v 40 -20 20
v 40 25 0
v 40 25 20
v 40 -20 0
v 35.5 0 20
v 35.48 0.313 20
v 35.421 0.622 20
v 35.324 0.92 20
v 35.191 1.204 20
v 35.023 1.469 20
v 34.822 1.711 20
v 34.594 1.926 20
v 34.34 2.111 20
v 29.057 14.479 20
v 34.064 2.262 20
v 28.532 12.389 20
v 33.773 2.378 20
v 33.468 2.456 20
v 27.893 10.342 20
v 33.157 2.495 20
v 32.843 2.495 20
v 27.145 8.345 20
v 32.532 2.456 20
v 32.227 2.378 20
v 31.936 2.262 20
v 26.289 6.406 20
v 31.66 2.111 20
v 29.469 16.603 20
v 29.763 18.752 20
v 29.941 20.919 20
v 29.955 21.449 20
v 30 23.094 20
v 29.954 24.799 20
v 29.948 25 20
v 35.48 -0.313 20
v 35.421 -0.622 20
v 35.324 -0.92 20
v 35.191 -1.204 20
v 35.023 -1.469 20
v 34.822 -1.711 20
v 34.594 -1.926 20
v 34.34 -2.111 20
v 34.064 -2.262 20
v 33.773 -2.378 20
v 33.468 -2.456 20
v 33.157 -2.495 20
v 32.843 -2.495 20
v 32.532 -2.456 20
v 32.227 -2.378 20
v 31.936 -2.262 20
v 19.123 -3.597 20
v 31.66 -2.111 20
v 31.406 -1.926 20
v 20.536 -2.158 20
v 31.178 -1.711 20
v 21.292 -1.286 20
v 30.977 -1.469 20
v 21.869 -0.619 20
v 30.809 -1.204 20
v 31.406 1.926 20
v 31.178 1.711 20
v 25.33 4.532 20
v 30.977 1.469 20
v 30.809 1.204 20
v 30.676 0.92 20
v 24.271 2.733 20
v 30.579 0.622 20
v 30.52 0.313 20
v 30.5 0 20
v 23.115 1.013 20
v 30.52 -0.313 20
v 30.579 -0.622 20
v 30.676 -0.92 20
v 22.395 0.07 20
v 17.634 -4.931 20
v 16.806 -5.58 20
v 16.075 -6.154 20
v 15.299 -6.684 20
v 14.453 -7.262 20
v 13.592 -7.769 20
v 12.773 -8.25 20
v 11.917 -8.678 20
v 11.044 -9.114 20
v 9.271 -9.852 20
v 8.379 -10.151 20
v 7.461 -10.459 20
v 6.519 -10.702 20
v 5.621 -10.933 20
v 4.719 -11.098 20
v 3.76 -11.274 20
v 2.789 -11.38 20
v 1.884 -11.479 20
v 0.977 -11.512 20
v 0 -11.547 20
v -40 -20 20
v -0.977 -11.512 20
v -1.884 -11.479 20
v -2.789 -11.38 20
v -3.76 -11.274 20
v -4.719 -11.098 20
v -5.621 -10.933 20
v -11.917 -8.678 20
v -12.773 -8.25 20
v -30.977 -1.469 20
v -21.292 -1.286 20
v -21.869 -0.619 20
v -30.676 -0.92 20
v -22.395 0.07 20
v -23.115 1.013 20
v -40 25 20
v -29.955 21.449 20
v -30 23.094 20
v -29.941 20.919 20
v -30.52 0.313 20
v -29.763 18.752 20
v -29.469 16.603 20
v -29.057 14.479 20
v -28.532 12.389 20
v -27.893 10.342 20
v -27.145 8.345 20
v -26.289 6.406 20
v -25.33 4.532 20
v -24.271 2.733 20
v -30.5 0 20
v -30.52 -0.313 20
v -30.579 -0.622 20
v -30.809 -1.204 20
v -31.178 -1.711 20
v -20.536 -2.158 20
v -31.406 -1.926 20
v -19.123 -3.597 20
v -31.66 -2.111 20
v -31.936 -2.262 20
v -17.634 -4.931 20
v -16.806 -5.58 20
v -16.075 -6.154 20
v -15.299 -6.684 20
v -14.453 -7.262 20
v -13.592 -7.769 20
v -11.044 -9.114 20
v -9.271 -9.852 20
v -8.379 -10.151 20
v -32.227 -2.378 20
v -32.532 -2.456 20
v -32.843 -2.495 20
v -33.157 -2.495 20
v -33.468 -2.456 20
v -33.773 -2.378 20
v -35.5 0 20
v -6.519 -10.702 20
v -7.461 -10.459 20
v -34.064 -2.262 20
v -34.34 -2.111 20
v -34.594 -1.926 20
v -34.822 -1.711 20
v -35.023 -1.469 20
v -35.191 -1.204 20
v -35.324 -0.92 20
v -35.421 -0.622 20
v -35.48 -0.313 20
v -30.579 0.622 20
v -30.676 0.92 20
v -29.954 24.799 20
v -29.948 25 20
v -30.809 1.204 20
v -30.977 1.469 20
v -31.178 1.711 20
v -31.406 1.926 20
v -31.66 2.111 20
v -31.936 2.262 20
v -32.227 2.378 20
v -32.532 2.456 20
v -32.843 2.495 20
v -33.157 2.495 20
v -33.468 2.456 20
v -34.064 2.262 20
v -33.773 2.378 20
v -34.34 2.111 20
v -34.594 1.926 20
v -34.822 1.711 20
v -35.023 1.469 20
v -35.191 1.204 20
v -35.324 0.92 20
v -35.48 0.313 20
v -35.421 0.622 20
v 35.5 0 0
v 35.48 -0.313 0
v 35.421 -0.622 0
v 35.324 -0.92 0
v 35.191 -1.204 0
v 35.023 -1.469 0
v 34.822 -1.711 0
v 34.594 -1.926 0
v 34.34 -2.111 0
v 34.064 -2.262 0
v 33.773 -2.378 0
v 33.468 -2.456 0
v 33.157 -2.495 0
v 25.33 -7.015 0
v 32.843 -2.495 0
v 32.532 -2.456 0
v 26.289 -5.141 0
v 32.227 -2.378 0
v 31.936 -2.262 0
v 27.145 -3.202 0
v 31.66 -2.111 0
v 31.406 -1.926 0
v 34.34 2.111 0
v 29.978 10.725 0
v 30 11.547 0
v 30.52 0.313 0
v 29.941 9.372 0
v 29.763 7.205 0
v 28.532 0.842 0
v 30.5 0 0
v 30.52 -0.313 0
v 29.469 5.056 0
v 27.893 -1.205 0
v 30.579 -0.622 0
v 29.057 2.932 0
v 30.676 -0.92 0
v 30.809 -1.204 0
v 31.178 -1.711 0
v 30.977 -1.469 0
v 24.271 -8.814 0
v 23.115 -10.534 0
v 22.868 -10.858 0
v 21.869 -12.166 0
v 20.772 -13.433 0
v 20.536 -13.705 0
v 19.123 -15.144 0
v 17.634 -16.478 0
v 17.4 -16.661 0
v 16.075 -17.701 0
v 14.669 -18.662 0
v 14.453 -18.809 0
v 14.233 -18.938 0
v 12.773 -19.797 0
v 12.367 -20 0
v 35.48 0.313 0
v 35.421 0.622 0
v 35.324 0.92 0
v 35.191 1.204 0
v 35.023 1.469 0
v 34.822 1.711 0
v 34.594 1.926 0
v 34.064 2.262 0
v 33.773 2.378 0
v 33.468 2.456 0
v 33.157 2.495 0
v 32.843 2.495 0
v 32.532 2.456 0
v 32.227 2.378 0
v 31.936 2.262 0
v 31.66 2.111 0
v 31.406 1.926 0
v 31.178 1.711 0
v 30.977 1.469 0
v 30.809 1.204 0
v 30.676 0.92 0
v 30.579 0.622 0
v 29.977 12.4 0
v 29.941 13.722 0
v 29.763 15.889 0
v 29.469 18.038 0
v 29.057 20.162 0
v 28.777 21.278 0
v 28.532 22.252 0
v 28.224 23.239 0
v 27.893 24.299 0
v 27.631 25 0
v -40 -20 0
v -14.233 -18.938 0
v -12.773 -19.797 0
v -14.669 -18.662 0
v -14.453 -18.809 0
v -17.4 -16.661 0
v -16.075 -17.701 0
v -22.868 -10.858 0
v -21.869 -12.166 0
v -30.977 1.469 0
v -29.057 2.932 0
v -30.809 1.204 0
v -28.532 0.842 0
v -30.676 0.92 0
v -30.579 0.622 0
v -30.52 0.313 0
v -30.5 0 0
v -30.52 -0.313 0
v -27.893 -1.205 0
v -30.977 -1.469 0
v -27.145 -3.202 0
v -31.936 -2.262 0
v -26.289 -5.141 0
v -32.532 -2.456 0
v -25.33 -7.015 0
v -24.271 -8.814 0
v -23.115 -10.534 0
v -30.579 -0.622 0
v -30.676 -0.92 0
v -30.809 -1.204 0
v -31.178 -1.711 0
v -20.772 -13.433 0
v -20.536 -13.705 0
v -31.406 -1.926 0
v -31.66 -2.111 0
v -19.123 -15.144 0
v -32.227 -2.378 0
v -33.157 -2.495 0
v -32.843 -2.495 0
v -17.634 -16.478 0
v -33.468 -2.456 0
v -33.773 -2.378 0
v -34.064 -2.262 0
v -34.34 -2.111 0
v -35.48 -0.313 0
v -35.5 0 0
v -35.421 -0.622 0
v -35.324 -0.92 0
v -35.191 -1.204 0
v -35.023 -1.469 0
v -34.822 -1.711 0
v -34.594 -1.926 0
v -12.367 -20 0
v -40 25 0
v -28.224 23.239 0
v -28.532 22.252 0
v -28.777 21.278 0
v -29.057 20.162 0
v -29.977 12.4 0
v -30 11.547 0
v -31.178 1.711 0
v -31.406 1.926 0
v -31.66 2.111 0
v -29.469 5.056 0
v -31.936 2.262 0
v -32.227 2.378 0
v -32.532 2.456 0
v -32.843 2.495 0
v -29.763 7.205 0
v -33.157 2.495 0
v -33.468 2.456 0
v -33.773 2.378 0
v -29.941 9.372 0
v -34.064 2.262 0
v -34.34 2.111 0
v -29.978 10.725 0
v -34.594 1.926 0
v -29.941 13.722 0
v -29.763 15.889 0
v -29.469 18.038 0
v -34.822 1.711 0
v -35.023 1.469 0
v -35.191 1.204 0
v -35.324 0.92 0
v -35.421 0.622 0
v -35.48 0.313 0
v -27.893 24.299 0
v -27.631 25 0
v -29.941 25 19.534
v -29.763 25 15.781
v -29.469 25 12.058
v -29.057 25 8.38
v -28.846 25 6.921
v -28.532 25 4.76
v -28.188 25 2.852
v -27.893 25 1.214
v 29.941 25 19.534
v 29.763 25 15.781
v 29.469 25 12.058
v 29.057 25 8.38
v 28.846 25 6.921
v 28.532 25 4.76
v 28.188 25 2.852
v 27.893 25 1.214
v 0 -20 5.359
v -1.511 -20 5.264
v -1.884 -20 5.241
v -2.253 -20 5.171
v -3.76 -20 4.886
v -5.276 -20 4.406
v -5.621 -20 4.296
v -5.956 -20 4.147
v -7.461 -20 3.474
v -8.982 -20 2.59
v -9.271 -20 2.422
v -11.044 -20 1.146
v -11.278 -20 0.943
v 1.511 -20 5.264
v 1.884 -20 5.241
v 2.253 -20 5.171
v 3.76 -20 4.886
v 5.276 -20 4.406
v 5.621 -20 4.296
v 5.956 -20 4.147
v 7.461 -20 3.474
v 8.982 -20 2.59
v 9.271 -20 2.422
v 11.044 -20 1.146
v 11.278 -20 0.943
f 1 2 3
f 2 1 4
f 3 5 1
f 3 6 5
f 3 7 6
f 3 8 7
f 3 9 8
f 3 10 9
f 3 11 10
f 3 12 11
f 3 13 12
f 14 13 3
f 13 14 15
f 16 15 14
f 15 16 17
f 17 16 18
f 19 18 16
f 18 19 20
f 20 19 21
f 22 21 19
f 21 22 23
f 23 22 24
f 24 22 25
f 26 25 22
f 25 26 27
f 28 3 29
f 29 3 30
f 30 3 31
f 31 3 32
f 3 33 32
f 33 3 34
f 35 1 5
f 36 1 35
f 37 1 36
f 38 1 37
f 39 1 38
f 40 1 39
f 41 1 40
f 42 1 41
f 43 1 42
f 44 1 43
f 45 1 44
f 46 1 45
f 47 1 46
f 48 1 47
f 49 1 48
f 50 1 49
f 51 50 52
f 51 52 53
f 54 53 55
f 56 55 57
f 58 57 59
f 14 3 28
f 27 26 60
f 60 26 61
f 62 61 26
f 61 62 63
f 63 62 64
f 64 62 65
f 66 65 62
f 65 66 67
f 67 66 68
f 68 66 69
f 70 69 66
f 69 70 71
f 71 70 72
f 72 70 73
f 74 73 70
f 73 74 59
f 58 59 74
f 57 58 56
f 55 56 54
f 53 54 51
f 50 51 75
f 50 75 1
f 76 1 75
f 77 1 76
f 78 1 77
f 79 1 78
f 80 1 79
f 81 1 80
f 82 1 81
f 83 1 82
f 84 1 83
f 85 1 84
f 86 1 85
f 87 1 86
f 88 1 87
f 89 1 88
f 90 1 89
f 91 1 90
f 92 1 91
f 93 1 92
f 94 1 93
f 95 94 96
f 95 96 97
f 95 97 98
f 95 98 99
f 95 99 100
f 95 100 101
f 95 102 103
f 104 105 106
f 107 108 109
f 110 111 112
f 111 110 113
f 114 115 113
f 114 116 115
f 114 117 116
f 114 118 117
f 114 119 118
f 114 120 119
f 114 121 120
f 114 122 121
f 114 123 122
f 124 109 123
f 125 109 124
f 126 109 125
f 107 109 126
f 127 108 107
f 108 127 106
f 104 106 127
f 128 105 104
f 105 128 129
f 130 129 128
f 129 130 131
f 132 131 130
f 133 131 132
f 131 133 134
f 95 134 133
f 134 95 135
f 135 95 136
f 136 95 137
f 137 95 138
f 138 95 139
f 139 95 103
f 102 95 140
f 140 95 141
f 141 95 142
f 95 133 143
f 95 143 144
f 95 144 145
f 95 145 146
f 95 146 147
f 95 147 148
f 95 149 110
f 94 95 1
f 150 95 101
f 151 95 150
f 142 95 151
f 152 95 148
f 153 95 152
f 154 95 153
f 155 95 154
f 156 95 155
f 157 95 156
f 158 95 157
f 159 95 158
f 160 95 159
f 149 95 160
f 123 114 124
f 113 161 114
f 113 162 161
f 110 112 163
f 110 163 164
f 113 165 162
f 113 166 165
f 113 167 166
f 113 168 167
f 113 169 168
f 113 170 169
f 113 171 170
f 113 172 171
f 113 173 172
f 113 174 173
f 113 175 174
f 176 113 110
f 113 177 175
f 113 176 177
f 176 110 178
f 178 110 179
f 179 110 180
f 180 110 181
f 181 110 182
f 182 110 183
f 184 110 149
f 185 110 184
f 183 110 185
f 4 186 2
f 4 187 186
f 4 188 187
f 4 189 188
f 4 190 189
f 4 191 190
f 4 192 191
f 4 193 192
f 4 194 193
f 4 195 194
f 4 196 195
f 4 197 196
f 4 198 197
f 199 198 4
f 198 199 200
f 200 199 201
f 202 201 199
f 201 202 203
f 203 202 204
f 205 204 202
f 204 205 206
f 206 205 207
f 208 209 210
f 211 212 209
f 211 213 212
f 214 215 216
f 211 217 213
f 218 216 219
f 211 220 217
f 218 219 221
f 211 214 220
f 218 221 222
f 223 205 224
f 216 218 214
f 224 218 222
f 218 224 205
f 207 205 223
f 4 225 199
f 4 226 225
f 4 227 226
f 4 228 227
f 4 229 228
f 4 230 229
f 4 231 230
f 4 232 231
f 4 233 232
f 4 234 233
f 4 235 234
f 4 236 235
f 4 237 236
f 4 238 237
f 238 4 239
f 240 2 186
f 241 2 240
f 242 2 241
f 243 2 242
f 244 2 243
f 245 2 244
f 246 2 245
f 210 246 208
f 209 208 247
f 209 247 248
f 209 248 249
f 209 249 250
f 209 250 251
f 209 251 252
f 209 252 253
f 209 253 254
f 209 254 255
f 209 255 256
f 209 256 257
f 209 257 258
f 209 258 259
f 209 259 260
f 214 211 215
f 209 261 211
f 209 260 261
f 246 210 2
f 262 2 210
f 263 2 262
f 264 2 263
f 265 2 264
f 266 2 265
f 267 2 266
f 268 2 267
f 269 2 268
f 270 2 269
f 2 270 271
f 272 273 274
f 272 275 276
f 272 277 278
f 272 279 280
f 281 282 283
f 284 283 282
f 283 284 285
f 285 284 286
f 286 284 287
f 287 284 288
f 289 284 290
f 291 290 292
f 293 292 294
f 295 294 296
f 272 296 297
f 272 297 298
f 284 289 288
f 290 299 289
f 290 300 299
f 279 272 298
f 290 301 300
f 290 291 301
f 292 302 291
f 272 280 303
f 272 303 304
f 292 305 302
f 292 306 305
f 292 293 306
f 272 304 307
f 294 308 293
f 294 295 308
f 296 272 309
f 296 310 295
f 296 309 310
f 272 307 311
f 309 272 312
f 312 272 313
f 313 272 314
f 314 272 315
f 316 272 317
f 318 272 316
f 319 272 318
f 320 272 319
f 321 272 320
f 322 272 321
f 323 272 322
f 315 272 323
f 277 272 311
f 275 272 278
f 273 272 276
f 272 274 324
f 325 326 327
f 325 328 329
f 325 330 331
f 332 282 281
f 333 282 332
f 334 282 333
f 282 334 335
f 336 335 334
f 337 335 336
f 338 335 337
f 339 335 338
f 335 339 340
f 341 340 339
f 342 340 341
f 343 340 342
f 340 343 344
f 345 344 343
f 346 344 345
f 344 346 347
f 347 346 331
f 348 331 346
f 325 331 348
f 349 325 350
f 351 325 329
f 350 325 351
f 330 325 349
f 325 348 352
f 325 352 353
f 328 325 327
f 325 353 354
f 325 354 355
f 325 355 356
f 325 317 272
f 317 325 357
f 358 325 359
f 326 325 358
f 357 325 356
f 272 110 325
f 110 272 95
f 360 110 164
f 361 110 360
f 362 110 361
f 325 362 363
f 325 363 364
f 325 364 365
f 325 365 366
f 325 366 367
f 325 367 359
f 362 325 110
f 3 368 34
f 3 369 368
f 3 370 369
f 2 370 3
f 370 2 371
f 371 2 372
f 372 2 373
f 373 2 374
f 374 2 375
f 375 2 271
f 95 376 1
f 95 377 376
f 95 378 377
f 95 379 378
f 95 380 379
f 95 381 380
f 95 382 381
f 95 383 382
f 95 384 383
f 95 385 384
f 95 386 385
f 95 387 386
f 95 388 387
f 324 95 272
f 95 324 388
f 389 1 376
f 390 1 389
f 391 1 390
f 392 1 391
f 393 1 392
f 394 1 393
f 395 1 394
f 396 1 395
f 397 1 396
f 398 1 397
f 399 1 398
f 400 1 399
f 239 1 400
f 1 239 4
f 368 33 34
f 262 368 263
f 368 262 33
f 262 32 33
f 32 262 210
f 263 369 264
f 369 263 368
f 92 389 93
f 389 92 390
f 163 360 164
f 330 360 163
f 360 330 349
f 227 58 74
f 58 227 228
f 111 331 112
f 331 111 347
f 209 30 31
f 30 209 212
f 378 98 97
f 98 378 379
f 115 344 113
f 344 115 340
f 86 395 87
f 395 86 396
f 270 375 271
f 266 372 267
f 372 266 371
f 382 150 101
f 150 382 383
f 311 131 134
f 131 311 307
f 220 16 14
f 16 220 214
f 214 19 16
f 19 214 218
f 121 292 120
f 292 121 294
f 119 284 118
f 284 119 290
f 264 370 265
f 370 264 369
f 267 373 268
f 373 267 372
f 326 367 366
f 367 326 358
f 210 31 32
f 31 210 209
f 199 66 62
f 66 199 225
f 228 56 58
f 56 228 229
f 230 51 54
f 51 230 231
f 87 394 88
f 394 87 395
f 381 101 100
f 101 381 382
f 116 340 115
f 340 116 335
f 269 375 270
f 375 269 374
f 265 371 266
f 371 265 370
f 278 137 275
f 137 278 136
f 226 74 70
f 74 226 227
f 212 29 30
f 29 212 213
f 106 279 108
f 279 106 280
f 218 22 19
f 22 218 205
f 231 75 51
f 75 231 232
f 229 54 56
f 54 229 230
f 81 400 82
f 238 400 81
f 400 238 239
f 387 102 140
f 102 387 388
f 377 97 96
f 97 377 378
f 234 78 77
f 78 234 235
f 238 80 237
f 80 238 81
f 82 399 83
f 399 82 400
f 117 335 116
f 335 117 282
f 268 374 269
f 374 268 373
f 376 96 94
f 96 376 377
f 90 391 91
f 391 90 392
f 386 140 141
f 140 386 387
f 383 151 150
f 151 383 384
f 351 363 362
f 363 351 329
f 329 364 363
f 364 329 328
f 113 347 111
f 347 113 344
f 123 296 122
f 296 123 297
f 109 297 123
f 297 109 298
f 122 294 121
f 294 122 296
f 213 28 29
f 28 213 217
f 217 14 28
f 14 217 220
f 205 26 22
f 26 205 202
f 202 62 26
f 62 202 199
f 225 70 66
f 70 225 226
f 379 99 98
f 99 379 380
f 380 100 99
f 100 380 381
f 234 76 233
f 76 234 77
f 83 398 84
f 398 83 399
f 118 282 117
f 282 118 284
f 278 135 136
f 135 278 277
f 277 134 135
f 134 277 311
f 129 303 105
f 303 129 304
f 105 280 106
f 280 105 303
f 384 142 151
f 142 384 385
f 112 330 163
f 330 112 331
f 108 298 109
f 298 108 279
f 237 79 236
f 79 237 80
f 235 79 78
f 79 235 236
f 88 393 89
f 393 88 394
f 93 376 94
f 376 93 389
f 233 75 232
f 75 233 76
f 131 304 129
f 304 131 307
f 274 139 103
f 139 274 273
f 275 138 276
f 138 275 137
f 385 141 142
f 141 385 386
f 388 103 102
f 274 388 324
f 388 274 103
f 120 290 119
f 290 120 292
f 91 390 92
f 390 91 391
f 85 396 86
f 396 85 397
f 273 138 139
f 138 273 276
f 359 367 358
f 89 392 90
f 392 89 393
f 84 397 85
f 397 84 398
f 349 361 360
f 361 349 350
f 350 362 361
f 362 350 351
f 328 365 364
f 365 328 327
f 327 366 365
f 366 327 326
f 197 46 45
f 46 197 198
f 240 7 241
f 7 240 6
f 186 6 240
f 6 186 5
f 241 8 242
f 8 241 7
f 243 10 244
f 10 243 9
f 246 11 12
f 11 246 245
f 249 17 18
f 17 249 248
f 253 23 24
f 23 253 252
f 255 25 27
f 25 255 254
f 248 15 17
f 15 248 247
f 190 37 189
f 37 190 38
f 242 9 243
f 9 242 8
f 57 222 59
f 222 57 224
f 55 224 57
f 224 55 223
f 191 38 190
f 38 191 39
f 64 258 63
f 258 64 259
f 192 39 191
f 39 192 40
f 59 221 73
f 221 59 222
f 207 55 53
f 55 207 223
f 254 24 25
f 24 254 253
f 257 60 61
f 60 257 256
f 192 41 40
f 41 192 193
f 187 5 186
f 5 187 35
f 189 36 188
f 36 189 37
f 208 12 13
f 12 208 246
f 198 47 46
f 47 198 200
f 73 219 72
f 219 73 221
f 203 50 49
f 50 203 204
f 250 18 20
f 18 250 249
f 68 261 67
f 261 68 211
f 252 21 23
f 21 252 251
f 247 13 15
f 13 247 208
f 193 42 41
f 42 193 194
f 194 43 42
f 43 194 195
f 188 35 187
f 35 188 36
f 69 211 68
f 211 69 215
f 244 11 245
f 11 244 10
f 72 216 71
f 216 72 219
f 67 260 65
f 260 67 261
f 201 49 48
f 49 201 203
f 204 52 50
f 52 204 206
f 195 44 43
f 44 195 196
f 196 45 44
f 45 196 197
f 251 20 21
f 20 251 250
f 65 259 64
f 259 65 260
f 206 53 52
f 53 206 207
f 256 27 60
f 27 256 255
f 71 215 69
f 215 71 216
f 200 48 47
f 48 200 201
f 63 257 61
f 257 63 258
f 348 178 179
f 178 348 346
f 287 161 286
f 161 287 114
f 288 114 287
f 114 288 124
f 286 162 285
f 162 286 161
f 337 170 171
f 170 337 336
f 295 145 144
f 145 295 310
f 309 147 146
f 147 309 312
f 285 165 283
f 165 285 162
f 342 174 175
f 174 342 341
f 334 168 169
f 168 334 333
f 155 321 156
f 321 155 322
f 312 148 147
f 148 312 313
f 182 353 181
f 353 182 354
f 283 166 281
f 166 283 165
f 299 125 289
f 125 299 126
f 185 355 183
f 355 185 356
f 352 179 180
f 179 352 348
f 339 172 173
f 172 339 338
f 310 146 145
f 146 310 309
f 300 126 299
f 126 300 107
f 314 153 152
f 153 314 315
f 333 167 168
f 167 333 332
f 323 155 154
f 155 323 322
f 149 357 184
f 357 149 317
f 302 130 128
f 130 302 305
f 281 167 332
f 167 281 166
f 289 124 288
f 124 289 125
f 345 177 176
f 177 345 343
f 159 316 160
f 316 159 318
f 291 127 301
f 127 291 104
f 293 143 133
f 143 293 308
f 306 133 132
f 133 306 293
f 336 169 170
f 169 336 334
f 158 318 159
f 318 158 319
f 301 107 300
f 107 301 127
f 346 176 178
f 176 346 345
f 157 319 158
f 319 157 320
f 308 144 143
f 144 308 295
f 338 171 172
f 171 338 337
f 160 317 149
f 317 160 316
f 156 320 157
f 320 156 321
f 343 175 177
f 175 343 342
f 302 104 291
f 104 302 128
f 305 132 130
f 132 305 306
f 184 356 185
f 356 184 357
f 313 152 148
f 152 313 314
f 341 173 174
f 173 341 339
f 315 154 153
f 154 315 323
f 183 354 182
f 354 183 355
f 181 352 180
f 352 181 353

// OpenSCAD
difference(){
	translate([-40,-20,0]){
		cube([80,45,20]);
	}
	translate([0,0,-20]){
		rotate([-30,0,0]){
			cylinder(r=30,h=60,$fn=100);
		}
	}

	// mounting holes
	translate([33,0,-1]){
		cylinder(r=2.5,h=30,$fn=50);
	}
	translate([-33,0,-1]){
		cylinder(r=2.5,h=30,$fn=50);
	}
}
